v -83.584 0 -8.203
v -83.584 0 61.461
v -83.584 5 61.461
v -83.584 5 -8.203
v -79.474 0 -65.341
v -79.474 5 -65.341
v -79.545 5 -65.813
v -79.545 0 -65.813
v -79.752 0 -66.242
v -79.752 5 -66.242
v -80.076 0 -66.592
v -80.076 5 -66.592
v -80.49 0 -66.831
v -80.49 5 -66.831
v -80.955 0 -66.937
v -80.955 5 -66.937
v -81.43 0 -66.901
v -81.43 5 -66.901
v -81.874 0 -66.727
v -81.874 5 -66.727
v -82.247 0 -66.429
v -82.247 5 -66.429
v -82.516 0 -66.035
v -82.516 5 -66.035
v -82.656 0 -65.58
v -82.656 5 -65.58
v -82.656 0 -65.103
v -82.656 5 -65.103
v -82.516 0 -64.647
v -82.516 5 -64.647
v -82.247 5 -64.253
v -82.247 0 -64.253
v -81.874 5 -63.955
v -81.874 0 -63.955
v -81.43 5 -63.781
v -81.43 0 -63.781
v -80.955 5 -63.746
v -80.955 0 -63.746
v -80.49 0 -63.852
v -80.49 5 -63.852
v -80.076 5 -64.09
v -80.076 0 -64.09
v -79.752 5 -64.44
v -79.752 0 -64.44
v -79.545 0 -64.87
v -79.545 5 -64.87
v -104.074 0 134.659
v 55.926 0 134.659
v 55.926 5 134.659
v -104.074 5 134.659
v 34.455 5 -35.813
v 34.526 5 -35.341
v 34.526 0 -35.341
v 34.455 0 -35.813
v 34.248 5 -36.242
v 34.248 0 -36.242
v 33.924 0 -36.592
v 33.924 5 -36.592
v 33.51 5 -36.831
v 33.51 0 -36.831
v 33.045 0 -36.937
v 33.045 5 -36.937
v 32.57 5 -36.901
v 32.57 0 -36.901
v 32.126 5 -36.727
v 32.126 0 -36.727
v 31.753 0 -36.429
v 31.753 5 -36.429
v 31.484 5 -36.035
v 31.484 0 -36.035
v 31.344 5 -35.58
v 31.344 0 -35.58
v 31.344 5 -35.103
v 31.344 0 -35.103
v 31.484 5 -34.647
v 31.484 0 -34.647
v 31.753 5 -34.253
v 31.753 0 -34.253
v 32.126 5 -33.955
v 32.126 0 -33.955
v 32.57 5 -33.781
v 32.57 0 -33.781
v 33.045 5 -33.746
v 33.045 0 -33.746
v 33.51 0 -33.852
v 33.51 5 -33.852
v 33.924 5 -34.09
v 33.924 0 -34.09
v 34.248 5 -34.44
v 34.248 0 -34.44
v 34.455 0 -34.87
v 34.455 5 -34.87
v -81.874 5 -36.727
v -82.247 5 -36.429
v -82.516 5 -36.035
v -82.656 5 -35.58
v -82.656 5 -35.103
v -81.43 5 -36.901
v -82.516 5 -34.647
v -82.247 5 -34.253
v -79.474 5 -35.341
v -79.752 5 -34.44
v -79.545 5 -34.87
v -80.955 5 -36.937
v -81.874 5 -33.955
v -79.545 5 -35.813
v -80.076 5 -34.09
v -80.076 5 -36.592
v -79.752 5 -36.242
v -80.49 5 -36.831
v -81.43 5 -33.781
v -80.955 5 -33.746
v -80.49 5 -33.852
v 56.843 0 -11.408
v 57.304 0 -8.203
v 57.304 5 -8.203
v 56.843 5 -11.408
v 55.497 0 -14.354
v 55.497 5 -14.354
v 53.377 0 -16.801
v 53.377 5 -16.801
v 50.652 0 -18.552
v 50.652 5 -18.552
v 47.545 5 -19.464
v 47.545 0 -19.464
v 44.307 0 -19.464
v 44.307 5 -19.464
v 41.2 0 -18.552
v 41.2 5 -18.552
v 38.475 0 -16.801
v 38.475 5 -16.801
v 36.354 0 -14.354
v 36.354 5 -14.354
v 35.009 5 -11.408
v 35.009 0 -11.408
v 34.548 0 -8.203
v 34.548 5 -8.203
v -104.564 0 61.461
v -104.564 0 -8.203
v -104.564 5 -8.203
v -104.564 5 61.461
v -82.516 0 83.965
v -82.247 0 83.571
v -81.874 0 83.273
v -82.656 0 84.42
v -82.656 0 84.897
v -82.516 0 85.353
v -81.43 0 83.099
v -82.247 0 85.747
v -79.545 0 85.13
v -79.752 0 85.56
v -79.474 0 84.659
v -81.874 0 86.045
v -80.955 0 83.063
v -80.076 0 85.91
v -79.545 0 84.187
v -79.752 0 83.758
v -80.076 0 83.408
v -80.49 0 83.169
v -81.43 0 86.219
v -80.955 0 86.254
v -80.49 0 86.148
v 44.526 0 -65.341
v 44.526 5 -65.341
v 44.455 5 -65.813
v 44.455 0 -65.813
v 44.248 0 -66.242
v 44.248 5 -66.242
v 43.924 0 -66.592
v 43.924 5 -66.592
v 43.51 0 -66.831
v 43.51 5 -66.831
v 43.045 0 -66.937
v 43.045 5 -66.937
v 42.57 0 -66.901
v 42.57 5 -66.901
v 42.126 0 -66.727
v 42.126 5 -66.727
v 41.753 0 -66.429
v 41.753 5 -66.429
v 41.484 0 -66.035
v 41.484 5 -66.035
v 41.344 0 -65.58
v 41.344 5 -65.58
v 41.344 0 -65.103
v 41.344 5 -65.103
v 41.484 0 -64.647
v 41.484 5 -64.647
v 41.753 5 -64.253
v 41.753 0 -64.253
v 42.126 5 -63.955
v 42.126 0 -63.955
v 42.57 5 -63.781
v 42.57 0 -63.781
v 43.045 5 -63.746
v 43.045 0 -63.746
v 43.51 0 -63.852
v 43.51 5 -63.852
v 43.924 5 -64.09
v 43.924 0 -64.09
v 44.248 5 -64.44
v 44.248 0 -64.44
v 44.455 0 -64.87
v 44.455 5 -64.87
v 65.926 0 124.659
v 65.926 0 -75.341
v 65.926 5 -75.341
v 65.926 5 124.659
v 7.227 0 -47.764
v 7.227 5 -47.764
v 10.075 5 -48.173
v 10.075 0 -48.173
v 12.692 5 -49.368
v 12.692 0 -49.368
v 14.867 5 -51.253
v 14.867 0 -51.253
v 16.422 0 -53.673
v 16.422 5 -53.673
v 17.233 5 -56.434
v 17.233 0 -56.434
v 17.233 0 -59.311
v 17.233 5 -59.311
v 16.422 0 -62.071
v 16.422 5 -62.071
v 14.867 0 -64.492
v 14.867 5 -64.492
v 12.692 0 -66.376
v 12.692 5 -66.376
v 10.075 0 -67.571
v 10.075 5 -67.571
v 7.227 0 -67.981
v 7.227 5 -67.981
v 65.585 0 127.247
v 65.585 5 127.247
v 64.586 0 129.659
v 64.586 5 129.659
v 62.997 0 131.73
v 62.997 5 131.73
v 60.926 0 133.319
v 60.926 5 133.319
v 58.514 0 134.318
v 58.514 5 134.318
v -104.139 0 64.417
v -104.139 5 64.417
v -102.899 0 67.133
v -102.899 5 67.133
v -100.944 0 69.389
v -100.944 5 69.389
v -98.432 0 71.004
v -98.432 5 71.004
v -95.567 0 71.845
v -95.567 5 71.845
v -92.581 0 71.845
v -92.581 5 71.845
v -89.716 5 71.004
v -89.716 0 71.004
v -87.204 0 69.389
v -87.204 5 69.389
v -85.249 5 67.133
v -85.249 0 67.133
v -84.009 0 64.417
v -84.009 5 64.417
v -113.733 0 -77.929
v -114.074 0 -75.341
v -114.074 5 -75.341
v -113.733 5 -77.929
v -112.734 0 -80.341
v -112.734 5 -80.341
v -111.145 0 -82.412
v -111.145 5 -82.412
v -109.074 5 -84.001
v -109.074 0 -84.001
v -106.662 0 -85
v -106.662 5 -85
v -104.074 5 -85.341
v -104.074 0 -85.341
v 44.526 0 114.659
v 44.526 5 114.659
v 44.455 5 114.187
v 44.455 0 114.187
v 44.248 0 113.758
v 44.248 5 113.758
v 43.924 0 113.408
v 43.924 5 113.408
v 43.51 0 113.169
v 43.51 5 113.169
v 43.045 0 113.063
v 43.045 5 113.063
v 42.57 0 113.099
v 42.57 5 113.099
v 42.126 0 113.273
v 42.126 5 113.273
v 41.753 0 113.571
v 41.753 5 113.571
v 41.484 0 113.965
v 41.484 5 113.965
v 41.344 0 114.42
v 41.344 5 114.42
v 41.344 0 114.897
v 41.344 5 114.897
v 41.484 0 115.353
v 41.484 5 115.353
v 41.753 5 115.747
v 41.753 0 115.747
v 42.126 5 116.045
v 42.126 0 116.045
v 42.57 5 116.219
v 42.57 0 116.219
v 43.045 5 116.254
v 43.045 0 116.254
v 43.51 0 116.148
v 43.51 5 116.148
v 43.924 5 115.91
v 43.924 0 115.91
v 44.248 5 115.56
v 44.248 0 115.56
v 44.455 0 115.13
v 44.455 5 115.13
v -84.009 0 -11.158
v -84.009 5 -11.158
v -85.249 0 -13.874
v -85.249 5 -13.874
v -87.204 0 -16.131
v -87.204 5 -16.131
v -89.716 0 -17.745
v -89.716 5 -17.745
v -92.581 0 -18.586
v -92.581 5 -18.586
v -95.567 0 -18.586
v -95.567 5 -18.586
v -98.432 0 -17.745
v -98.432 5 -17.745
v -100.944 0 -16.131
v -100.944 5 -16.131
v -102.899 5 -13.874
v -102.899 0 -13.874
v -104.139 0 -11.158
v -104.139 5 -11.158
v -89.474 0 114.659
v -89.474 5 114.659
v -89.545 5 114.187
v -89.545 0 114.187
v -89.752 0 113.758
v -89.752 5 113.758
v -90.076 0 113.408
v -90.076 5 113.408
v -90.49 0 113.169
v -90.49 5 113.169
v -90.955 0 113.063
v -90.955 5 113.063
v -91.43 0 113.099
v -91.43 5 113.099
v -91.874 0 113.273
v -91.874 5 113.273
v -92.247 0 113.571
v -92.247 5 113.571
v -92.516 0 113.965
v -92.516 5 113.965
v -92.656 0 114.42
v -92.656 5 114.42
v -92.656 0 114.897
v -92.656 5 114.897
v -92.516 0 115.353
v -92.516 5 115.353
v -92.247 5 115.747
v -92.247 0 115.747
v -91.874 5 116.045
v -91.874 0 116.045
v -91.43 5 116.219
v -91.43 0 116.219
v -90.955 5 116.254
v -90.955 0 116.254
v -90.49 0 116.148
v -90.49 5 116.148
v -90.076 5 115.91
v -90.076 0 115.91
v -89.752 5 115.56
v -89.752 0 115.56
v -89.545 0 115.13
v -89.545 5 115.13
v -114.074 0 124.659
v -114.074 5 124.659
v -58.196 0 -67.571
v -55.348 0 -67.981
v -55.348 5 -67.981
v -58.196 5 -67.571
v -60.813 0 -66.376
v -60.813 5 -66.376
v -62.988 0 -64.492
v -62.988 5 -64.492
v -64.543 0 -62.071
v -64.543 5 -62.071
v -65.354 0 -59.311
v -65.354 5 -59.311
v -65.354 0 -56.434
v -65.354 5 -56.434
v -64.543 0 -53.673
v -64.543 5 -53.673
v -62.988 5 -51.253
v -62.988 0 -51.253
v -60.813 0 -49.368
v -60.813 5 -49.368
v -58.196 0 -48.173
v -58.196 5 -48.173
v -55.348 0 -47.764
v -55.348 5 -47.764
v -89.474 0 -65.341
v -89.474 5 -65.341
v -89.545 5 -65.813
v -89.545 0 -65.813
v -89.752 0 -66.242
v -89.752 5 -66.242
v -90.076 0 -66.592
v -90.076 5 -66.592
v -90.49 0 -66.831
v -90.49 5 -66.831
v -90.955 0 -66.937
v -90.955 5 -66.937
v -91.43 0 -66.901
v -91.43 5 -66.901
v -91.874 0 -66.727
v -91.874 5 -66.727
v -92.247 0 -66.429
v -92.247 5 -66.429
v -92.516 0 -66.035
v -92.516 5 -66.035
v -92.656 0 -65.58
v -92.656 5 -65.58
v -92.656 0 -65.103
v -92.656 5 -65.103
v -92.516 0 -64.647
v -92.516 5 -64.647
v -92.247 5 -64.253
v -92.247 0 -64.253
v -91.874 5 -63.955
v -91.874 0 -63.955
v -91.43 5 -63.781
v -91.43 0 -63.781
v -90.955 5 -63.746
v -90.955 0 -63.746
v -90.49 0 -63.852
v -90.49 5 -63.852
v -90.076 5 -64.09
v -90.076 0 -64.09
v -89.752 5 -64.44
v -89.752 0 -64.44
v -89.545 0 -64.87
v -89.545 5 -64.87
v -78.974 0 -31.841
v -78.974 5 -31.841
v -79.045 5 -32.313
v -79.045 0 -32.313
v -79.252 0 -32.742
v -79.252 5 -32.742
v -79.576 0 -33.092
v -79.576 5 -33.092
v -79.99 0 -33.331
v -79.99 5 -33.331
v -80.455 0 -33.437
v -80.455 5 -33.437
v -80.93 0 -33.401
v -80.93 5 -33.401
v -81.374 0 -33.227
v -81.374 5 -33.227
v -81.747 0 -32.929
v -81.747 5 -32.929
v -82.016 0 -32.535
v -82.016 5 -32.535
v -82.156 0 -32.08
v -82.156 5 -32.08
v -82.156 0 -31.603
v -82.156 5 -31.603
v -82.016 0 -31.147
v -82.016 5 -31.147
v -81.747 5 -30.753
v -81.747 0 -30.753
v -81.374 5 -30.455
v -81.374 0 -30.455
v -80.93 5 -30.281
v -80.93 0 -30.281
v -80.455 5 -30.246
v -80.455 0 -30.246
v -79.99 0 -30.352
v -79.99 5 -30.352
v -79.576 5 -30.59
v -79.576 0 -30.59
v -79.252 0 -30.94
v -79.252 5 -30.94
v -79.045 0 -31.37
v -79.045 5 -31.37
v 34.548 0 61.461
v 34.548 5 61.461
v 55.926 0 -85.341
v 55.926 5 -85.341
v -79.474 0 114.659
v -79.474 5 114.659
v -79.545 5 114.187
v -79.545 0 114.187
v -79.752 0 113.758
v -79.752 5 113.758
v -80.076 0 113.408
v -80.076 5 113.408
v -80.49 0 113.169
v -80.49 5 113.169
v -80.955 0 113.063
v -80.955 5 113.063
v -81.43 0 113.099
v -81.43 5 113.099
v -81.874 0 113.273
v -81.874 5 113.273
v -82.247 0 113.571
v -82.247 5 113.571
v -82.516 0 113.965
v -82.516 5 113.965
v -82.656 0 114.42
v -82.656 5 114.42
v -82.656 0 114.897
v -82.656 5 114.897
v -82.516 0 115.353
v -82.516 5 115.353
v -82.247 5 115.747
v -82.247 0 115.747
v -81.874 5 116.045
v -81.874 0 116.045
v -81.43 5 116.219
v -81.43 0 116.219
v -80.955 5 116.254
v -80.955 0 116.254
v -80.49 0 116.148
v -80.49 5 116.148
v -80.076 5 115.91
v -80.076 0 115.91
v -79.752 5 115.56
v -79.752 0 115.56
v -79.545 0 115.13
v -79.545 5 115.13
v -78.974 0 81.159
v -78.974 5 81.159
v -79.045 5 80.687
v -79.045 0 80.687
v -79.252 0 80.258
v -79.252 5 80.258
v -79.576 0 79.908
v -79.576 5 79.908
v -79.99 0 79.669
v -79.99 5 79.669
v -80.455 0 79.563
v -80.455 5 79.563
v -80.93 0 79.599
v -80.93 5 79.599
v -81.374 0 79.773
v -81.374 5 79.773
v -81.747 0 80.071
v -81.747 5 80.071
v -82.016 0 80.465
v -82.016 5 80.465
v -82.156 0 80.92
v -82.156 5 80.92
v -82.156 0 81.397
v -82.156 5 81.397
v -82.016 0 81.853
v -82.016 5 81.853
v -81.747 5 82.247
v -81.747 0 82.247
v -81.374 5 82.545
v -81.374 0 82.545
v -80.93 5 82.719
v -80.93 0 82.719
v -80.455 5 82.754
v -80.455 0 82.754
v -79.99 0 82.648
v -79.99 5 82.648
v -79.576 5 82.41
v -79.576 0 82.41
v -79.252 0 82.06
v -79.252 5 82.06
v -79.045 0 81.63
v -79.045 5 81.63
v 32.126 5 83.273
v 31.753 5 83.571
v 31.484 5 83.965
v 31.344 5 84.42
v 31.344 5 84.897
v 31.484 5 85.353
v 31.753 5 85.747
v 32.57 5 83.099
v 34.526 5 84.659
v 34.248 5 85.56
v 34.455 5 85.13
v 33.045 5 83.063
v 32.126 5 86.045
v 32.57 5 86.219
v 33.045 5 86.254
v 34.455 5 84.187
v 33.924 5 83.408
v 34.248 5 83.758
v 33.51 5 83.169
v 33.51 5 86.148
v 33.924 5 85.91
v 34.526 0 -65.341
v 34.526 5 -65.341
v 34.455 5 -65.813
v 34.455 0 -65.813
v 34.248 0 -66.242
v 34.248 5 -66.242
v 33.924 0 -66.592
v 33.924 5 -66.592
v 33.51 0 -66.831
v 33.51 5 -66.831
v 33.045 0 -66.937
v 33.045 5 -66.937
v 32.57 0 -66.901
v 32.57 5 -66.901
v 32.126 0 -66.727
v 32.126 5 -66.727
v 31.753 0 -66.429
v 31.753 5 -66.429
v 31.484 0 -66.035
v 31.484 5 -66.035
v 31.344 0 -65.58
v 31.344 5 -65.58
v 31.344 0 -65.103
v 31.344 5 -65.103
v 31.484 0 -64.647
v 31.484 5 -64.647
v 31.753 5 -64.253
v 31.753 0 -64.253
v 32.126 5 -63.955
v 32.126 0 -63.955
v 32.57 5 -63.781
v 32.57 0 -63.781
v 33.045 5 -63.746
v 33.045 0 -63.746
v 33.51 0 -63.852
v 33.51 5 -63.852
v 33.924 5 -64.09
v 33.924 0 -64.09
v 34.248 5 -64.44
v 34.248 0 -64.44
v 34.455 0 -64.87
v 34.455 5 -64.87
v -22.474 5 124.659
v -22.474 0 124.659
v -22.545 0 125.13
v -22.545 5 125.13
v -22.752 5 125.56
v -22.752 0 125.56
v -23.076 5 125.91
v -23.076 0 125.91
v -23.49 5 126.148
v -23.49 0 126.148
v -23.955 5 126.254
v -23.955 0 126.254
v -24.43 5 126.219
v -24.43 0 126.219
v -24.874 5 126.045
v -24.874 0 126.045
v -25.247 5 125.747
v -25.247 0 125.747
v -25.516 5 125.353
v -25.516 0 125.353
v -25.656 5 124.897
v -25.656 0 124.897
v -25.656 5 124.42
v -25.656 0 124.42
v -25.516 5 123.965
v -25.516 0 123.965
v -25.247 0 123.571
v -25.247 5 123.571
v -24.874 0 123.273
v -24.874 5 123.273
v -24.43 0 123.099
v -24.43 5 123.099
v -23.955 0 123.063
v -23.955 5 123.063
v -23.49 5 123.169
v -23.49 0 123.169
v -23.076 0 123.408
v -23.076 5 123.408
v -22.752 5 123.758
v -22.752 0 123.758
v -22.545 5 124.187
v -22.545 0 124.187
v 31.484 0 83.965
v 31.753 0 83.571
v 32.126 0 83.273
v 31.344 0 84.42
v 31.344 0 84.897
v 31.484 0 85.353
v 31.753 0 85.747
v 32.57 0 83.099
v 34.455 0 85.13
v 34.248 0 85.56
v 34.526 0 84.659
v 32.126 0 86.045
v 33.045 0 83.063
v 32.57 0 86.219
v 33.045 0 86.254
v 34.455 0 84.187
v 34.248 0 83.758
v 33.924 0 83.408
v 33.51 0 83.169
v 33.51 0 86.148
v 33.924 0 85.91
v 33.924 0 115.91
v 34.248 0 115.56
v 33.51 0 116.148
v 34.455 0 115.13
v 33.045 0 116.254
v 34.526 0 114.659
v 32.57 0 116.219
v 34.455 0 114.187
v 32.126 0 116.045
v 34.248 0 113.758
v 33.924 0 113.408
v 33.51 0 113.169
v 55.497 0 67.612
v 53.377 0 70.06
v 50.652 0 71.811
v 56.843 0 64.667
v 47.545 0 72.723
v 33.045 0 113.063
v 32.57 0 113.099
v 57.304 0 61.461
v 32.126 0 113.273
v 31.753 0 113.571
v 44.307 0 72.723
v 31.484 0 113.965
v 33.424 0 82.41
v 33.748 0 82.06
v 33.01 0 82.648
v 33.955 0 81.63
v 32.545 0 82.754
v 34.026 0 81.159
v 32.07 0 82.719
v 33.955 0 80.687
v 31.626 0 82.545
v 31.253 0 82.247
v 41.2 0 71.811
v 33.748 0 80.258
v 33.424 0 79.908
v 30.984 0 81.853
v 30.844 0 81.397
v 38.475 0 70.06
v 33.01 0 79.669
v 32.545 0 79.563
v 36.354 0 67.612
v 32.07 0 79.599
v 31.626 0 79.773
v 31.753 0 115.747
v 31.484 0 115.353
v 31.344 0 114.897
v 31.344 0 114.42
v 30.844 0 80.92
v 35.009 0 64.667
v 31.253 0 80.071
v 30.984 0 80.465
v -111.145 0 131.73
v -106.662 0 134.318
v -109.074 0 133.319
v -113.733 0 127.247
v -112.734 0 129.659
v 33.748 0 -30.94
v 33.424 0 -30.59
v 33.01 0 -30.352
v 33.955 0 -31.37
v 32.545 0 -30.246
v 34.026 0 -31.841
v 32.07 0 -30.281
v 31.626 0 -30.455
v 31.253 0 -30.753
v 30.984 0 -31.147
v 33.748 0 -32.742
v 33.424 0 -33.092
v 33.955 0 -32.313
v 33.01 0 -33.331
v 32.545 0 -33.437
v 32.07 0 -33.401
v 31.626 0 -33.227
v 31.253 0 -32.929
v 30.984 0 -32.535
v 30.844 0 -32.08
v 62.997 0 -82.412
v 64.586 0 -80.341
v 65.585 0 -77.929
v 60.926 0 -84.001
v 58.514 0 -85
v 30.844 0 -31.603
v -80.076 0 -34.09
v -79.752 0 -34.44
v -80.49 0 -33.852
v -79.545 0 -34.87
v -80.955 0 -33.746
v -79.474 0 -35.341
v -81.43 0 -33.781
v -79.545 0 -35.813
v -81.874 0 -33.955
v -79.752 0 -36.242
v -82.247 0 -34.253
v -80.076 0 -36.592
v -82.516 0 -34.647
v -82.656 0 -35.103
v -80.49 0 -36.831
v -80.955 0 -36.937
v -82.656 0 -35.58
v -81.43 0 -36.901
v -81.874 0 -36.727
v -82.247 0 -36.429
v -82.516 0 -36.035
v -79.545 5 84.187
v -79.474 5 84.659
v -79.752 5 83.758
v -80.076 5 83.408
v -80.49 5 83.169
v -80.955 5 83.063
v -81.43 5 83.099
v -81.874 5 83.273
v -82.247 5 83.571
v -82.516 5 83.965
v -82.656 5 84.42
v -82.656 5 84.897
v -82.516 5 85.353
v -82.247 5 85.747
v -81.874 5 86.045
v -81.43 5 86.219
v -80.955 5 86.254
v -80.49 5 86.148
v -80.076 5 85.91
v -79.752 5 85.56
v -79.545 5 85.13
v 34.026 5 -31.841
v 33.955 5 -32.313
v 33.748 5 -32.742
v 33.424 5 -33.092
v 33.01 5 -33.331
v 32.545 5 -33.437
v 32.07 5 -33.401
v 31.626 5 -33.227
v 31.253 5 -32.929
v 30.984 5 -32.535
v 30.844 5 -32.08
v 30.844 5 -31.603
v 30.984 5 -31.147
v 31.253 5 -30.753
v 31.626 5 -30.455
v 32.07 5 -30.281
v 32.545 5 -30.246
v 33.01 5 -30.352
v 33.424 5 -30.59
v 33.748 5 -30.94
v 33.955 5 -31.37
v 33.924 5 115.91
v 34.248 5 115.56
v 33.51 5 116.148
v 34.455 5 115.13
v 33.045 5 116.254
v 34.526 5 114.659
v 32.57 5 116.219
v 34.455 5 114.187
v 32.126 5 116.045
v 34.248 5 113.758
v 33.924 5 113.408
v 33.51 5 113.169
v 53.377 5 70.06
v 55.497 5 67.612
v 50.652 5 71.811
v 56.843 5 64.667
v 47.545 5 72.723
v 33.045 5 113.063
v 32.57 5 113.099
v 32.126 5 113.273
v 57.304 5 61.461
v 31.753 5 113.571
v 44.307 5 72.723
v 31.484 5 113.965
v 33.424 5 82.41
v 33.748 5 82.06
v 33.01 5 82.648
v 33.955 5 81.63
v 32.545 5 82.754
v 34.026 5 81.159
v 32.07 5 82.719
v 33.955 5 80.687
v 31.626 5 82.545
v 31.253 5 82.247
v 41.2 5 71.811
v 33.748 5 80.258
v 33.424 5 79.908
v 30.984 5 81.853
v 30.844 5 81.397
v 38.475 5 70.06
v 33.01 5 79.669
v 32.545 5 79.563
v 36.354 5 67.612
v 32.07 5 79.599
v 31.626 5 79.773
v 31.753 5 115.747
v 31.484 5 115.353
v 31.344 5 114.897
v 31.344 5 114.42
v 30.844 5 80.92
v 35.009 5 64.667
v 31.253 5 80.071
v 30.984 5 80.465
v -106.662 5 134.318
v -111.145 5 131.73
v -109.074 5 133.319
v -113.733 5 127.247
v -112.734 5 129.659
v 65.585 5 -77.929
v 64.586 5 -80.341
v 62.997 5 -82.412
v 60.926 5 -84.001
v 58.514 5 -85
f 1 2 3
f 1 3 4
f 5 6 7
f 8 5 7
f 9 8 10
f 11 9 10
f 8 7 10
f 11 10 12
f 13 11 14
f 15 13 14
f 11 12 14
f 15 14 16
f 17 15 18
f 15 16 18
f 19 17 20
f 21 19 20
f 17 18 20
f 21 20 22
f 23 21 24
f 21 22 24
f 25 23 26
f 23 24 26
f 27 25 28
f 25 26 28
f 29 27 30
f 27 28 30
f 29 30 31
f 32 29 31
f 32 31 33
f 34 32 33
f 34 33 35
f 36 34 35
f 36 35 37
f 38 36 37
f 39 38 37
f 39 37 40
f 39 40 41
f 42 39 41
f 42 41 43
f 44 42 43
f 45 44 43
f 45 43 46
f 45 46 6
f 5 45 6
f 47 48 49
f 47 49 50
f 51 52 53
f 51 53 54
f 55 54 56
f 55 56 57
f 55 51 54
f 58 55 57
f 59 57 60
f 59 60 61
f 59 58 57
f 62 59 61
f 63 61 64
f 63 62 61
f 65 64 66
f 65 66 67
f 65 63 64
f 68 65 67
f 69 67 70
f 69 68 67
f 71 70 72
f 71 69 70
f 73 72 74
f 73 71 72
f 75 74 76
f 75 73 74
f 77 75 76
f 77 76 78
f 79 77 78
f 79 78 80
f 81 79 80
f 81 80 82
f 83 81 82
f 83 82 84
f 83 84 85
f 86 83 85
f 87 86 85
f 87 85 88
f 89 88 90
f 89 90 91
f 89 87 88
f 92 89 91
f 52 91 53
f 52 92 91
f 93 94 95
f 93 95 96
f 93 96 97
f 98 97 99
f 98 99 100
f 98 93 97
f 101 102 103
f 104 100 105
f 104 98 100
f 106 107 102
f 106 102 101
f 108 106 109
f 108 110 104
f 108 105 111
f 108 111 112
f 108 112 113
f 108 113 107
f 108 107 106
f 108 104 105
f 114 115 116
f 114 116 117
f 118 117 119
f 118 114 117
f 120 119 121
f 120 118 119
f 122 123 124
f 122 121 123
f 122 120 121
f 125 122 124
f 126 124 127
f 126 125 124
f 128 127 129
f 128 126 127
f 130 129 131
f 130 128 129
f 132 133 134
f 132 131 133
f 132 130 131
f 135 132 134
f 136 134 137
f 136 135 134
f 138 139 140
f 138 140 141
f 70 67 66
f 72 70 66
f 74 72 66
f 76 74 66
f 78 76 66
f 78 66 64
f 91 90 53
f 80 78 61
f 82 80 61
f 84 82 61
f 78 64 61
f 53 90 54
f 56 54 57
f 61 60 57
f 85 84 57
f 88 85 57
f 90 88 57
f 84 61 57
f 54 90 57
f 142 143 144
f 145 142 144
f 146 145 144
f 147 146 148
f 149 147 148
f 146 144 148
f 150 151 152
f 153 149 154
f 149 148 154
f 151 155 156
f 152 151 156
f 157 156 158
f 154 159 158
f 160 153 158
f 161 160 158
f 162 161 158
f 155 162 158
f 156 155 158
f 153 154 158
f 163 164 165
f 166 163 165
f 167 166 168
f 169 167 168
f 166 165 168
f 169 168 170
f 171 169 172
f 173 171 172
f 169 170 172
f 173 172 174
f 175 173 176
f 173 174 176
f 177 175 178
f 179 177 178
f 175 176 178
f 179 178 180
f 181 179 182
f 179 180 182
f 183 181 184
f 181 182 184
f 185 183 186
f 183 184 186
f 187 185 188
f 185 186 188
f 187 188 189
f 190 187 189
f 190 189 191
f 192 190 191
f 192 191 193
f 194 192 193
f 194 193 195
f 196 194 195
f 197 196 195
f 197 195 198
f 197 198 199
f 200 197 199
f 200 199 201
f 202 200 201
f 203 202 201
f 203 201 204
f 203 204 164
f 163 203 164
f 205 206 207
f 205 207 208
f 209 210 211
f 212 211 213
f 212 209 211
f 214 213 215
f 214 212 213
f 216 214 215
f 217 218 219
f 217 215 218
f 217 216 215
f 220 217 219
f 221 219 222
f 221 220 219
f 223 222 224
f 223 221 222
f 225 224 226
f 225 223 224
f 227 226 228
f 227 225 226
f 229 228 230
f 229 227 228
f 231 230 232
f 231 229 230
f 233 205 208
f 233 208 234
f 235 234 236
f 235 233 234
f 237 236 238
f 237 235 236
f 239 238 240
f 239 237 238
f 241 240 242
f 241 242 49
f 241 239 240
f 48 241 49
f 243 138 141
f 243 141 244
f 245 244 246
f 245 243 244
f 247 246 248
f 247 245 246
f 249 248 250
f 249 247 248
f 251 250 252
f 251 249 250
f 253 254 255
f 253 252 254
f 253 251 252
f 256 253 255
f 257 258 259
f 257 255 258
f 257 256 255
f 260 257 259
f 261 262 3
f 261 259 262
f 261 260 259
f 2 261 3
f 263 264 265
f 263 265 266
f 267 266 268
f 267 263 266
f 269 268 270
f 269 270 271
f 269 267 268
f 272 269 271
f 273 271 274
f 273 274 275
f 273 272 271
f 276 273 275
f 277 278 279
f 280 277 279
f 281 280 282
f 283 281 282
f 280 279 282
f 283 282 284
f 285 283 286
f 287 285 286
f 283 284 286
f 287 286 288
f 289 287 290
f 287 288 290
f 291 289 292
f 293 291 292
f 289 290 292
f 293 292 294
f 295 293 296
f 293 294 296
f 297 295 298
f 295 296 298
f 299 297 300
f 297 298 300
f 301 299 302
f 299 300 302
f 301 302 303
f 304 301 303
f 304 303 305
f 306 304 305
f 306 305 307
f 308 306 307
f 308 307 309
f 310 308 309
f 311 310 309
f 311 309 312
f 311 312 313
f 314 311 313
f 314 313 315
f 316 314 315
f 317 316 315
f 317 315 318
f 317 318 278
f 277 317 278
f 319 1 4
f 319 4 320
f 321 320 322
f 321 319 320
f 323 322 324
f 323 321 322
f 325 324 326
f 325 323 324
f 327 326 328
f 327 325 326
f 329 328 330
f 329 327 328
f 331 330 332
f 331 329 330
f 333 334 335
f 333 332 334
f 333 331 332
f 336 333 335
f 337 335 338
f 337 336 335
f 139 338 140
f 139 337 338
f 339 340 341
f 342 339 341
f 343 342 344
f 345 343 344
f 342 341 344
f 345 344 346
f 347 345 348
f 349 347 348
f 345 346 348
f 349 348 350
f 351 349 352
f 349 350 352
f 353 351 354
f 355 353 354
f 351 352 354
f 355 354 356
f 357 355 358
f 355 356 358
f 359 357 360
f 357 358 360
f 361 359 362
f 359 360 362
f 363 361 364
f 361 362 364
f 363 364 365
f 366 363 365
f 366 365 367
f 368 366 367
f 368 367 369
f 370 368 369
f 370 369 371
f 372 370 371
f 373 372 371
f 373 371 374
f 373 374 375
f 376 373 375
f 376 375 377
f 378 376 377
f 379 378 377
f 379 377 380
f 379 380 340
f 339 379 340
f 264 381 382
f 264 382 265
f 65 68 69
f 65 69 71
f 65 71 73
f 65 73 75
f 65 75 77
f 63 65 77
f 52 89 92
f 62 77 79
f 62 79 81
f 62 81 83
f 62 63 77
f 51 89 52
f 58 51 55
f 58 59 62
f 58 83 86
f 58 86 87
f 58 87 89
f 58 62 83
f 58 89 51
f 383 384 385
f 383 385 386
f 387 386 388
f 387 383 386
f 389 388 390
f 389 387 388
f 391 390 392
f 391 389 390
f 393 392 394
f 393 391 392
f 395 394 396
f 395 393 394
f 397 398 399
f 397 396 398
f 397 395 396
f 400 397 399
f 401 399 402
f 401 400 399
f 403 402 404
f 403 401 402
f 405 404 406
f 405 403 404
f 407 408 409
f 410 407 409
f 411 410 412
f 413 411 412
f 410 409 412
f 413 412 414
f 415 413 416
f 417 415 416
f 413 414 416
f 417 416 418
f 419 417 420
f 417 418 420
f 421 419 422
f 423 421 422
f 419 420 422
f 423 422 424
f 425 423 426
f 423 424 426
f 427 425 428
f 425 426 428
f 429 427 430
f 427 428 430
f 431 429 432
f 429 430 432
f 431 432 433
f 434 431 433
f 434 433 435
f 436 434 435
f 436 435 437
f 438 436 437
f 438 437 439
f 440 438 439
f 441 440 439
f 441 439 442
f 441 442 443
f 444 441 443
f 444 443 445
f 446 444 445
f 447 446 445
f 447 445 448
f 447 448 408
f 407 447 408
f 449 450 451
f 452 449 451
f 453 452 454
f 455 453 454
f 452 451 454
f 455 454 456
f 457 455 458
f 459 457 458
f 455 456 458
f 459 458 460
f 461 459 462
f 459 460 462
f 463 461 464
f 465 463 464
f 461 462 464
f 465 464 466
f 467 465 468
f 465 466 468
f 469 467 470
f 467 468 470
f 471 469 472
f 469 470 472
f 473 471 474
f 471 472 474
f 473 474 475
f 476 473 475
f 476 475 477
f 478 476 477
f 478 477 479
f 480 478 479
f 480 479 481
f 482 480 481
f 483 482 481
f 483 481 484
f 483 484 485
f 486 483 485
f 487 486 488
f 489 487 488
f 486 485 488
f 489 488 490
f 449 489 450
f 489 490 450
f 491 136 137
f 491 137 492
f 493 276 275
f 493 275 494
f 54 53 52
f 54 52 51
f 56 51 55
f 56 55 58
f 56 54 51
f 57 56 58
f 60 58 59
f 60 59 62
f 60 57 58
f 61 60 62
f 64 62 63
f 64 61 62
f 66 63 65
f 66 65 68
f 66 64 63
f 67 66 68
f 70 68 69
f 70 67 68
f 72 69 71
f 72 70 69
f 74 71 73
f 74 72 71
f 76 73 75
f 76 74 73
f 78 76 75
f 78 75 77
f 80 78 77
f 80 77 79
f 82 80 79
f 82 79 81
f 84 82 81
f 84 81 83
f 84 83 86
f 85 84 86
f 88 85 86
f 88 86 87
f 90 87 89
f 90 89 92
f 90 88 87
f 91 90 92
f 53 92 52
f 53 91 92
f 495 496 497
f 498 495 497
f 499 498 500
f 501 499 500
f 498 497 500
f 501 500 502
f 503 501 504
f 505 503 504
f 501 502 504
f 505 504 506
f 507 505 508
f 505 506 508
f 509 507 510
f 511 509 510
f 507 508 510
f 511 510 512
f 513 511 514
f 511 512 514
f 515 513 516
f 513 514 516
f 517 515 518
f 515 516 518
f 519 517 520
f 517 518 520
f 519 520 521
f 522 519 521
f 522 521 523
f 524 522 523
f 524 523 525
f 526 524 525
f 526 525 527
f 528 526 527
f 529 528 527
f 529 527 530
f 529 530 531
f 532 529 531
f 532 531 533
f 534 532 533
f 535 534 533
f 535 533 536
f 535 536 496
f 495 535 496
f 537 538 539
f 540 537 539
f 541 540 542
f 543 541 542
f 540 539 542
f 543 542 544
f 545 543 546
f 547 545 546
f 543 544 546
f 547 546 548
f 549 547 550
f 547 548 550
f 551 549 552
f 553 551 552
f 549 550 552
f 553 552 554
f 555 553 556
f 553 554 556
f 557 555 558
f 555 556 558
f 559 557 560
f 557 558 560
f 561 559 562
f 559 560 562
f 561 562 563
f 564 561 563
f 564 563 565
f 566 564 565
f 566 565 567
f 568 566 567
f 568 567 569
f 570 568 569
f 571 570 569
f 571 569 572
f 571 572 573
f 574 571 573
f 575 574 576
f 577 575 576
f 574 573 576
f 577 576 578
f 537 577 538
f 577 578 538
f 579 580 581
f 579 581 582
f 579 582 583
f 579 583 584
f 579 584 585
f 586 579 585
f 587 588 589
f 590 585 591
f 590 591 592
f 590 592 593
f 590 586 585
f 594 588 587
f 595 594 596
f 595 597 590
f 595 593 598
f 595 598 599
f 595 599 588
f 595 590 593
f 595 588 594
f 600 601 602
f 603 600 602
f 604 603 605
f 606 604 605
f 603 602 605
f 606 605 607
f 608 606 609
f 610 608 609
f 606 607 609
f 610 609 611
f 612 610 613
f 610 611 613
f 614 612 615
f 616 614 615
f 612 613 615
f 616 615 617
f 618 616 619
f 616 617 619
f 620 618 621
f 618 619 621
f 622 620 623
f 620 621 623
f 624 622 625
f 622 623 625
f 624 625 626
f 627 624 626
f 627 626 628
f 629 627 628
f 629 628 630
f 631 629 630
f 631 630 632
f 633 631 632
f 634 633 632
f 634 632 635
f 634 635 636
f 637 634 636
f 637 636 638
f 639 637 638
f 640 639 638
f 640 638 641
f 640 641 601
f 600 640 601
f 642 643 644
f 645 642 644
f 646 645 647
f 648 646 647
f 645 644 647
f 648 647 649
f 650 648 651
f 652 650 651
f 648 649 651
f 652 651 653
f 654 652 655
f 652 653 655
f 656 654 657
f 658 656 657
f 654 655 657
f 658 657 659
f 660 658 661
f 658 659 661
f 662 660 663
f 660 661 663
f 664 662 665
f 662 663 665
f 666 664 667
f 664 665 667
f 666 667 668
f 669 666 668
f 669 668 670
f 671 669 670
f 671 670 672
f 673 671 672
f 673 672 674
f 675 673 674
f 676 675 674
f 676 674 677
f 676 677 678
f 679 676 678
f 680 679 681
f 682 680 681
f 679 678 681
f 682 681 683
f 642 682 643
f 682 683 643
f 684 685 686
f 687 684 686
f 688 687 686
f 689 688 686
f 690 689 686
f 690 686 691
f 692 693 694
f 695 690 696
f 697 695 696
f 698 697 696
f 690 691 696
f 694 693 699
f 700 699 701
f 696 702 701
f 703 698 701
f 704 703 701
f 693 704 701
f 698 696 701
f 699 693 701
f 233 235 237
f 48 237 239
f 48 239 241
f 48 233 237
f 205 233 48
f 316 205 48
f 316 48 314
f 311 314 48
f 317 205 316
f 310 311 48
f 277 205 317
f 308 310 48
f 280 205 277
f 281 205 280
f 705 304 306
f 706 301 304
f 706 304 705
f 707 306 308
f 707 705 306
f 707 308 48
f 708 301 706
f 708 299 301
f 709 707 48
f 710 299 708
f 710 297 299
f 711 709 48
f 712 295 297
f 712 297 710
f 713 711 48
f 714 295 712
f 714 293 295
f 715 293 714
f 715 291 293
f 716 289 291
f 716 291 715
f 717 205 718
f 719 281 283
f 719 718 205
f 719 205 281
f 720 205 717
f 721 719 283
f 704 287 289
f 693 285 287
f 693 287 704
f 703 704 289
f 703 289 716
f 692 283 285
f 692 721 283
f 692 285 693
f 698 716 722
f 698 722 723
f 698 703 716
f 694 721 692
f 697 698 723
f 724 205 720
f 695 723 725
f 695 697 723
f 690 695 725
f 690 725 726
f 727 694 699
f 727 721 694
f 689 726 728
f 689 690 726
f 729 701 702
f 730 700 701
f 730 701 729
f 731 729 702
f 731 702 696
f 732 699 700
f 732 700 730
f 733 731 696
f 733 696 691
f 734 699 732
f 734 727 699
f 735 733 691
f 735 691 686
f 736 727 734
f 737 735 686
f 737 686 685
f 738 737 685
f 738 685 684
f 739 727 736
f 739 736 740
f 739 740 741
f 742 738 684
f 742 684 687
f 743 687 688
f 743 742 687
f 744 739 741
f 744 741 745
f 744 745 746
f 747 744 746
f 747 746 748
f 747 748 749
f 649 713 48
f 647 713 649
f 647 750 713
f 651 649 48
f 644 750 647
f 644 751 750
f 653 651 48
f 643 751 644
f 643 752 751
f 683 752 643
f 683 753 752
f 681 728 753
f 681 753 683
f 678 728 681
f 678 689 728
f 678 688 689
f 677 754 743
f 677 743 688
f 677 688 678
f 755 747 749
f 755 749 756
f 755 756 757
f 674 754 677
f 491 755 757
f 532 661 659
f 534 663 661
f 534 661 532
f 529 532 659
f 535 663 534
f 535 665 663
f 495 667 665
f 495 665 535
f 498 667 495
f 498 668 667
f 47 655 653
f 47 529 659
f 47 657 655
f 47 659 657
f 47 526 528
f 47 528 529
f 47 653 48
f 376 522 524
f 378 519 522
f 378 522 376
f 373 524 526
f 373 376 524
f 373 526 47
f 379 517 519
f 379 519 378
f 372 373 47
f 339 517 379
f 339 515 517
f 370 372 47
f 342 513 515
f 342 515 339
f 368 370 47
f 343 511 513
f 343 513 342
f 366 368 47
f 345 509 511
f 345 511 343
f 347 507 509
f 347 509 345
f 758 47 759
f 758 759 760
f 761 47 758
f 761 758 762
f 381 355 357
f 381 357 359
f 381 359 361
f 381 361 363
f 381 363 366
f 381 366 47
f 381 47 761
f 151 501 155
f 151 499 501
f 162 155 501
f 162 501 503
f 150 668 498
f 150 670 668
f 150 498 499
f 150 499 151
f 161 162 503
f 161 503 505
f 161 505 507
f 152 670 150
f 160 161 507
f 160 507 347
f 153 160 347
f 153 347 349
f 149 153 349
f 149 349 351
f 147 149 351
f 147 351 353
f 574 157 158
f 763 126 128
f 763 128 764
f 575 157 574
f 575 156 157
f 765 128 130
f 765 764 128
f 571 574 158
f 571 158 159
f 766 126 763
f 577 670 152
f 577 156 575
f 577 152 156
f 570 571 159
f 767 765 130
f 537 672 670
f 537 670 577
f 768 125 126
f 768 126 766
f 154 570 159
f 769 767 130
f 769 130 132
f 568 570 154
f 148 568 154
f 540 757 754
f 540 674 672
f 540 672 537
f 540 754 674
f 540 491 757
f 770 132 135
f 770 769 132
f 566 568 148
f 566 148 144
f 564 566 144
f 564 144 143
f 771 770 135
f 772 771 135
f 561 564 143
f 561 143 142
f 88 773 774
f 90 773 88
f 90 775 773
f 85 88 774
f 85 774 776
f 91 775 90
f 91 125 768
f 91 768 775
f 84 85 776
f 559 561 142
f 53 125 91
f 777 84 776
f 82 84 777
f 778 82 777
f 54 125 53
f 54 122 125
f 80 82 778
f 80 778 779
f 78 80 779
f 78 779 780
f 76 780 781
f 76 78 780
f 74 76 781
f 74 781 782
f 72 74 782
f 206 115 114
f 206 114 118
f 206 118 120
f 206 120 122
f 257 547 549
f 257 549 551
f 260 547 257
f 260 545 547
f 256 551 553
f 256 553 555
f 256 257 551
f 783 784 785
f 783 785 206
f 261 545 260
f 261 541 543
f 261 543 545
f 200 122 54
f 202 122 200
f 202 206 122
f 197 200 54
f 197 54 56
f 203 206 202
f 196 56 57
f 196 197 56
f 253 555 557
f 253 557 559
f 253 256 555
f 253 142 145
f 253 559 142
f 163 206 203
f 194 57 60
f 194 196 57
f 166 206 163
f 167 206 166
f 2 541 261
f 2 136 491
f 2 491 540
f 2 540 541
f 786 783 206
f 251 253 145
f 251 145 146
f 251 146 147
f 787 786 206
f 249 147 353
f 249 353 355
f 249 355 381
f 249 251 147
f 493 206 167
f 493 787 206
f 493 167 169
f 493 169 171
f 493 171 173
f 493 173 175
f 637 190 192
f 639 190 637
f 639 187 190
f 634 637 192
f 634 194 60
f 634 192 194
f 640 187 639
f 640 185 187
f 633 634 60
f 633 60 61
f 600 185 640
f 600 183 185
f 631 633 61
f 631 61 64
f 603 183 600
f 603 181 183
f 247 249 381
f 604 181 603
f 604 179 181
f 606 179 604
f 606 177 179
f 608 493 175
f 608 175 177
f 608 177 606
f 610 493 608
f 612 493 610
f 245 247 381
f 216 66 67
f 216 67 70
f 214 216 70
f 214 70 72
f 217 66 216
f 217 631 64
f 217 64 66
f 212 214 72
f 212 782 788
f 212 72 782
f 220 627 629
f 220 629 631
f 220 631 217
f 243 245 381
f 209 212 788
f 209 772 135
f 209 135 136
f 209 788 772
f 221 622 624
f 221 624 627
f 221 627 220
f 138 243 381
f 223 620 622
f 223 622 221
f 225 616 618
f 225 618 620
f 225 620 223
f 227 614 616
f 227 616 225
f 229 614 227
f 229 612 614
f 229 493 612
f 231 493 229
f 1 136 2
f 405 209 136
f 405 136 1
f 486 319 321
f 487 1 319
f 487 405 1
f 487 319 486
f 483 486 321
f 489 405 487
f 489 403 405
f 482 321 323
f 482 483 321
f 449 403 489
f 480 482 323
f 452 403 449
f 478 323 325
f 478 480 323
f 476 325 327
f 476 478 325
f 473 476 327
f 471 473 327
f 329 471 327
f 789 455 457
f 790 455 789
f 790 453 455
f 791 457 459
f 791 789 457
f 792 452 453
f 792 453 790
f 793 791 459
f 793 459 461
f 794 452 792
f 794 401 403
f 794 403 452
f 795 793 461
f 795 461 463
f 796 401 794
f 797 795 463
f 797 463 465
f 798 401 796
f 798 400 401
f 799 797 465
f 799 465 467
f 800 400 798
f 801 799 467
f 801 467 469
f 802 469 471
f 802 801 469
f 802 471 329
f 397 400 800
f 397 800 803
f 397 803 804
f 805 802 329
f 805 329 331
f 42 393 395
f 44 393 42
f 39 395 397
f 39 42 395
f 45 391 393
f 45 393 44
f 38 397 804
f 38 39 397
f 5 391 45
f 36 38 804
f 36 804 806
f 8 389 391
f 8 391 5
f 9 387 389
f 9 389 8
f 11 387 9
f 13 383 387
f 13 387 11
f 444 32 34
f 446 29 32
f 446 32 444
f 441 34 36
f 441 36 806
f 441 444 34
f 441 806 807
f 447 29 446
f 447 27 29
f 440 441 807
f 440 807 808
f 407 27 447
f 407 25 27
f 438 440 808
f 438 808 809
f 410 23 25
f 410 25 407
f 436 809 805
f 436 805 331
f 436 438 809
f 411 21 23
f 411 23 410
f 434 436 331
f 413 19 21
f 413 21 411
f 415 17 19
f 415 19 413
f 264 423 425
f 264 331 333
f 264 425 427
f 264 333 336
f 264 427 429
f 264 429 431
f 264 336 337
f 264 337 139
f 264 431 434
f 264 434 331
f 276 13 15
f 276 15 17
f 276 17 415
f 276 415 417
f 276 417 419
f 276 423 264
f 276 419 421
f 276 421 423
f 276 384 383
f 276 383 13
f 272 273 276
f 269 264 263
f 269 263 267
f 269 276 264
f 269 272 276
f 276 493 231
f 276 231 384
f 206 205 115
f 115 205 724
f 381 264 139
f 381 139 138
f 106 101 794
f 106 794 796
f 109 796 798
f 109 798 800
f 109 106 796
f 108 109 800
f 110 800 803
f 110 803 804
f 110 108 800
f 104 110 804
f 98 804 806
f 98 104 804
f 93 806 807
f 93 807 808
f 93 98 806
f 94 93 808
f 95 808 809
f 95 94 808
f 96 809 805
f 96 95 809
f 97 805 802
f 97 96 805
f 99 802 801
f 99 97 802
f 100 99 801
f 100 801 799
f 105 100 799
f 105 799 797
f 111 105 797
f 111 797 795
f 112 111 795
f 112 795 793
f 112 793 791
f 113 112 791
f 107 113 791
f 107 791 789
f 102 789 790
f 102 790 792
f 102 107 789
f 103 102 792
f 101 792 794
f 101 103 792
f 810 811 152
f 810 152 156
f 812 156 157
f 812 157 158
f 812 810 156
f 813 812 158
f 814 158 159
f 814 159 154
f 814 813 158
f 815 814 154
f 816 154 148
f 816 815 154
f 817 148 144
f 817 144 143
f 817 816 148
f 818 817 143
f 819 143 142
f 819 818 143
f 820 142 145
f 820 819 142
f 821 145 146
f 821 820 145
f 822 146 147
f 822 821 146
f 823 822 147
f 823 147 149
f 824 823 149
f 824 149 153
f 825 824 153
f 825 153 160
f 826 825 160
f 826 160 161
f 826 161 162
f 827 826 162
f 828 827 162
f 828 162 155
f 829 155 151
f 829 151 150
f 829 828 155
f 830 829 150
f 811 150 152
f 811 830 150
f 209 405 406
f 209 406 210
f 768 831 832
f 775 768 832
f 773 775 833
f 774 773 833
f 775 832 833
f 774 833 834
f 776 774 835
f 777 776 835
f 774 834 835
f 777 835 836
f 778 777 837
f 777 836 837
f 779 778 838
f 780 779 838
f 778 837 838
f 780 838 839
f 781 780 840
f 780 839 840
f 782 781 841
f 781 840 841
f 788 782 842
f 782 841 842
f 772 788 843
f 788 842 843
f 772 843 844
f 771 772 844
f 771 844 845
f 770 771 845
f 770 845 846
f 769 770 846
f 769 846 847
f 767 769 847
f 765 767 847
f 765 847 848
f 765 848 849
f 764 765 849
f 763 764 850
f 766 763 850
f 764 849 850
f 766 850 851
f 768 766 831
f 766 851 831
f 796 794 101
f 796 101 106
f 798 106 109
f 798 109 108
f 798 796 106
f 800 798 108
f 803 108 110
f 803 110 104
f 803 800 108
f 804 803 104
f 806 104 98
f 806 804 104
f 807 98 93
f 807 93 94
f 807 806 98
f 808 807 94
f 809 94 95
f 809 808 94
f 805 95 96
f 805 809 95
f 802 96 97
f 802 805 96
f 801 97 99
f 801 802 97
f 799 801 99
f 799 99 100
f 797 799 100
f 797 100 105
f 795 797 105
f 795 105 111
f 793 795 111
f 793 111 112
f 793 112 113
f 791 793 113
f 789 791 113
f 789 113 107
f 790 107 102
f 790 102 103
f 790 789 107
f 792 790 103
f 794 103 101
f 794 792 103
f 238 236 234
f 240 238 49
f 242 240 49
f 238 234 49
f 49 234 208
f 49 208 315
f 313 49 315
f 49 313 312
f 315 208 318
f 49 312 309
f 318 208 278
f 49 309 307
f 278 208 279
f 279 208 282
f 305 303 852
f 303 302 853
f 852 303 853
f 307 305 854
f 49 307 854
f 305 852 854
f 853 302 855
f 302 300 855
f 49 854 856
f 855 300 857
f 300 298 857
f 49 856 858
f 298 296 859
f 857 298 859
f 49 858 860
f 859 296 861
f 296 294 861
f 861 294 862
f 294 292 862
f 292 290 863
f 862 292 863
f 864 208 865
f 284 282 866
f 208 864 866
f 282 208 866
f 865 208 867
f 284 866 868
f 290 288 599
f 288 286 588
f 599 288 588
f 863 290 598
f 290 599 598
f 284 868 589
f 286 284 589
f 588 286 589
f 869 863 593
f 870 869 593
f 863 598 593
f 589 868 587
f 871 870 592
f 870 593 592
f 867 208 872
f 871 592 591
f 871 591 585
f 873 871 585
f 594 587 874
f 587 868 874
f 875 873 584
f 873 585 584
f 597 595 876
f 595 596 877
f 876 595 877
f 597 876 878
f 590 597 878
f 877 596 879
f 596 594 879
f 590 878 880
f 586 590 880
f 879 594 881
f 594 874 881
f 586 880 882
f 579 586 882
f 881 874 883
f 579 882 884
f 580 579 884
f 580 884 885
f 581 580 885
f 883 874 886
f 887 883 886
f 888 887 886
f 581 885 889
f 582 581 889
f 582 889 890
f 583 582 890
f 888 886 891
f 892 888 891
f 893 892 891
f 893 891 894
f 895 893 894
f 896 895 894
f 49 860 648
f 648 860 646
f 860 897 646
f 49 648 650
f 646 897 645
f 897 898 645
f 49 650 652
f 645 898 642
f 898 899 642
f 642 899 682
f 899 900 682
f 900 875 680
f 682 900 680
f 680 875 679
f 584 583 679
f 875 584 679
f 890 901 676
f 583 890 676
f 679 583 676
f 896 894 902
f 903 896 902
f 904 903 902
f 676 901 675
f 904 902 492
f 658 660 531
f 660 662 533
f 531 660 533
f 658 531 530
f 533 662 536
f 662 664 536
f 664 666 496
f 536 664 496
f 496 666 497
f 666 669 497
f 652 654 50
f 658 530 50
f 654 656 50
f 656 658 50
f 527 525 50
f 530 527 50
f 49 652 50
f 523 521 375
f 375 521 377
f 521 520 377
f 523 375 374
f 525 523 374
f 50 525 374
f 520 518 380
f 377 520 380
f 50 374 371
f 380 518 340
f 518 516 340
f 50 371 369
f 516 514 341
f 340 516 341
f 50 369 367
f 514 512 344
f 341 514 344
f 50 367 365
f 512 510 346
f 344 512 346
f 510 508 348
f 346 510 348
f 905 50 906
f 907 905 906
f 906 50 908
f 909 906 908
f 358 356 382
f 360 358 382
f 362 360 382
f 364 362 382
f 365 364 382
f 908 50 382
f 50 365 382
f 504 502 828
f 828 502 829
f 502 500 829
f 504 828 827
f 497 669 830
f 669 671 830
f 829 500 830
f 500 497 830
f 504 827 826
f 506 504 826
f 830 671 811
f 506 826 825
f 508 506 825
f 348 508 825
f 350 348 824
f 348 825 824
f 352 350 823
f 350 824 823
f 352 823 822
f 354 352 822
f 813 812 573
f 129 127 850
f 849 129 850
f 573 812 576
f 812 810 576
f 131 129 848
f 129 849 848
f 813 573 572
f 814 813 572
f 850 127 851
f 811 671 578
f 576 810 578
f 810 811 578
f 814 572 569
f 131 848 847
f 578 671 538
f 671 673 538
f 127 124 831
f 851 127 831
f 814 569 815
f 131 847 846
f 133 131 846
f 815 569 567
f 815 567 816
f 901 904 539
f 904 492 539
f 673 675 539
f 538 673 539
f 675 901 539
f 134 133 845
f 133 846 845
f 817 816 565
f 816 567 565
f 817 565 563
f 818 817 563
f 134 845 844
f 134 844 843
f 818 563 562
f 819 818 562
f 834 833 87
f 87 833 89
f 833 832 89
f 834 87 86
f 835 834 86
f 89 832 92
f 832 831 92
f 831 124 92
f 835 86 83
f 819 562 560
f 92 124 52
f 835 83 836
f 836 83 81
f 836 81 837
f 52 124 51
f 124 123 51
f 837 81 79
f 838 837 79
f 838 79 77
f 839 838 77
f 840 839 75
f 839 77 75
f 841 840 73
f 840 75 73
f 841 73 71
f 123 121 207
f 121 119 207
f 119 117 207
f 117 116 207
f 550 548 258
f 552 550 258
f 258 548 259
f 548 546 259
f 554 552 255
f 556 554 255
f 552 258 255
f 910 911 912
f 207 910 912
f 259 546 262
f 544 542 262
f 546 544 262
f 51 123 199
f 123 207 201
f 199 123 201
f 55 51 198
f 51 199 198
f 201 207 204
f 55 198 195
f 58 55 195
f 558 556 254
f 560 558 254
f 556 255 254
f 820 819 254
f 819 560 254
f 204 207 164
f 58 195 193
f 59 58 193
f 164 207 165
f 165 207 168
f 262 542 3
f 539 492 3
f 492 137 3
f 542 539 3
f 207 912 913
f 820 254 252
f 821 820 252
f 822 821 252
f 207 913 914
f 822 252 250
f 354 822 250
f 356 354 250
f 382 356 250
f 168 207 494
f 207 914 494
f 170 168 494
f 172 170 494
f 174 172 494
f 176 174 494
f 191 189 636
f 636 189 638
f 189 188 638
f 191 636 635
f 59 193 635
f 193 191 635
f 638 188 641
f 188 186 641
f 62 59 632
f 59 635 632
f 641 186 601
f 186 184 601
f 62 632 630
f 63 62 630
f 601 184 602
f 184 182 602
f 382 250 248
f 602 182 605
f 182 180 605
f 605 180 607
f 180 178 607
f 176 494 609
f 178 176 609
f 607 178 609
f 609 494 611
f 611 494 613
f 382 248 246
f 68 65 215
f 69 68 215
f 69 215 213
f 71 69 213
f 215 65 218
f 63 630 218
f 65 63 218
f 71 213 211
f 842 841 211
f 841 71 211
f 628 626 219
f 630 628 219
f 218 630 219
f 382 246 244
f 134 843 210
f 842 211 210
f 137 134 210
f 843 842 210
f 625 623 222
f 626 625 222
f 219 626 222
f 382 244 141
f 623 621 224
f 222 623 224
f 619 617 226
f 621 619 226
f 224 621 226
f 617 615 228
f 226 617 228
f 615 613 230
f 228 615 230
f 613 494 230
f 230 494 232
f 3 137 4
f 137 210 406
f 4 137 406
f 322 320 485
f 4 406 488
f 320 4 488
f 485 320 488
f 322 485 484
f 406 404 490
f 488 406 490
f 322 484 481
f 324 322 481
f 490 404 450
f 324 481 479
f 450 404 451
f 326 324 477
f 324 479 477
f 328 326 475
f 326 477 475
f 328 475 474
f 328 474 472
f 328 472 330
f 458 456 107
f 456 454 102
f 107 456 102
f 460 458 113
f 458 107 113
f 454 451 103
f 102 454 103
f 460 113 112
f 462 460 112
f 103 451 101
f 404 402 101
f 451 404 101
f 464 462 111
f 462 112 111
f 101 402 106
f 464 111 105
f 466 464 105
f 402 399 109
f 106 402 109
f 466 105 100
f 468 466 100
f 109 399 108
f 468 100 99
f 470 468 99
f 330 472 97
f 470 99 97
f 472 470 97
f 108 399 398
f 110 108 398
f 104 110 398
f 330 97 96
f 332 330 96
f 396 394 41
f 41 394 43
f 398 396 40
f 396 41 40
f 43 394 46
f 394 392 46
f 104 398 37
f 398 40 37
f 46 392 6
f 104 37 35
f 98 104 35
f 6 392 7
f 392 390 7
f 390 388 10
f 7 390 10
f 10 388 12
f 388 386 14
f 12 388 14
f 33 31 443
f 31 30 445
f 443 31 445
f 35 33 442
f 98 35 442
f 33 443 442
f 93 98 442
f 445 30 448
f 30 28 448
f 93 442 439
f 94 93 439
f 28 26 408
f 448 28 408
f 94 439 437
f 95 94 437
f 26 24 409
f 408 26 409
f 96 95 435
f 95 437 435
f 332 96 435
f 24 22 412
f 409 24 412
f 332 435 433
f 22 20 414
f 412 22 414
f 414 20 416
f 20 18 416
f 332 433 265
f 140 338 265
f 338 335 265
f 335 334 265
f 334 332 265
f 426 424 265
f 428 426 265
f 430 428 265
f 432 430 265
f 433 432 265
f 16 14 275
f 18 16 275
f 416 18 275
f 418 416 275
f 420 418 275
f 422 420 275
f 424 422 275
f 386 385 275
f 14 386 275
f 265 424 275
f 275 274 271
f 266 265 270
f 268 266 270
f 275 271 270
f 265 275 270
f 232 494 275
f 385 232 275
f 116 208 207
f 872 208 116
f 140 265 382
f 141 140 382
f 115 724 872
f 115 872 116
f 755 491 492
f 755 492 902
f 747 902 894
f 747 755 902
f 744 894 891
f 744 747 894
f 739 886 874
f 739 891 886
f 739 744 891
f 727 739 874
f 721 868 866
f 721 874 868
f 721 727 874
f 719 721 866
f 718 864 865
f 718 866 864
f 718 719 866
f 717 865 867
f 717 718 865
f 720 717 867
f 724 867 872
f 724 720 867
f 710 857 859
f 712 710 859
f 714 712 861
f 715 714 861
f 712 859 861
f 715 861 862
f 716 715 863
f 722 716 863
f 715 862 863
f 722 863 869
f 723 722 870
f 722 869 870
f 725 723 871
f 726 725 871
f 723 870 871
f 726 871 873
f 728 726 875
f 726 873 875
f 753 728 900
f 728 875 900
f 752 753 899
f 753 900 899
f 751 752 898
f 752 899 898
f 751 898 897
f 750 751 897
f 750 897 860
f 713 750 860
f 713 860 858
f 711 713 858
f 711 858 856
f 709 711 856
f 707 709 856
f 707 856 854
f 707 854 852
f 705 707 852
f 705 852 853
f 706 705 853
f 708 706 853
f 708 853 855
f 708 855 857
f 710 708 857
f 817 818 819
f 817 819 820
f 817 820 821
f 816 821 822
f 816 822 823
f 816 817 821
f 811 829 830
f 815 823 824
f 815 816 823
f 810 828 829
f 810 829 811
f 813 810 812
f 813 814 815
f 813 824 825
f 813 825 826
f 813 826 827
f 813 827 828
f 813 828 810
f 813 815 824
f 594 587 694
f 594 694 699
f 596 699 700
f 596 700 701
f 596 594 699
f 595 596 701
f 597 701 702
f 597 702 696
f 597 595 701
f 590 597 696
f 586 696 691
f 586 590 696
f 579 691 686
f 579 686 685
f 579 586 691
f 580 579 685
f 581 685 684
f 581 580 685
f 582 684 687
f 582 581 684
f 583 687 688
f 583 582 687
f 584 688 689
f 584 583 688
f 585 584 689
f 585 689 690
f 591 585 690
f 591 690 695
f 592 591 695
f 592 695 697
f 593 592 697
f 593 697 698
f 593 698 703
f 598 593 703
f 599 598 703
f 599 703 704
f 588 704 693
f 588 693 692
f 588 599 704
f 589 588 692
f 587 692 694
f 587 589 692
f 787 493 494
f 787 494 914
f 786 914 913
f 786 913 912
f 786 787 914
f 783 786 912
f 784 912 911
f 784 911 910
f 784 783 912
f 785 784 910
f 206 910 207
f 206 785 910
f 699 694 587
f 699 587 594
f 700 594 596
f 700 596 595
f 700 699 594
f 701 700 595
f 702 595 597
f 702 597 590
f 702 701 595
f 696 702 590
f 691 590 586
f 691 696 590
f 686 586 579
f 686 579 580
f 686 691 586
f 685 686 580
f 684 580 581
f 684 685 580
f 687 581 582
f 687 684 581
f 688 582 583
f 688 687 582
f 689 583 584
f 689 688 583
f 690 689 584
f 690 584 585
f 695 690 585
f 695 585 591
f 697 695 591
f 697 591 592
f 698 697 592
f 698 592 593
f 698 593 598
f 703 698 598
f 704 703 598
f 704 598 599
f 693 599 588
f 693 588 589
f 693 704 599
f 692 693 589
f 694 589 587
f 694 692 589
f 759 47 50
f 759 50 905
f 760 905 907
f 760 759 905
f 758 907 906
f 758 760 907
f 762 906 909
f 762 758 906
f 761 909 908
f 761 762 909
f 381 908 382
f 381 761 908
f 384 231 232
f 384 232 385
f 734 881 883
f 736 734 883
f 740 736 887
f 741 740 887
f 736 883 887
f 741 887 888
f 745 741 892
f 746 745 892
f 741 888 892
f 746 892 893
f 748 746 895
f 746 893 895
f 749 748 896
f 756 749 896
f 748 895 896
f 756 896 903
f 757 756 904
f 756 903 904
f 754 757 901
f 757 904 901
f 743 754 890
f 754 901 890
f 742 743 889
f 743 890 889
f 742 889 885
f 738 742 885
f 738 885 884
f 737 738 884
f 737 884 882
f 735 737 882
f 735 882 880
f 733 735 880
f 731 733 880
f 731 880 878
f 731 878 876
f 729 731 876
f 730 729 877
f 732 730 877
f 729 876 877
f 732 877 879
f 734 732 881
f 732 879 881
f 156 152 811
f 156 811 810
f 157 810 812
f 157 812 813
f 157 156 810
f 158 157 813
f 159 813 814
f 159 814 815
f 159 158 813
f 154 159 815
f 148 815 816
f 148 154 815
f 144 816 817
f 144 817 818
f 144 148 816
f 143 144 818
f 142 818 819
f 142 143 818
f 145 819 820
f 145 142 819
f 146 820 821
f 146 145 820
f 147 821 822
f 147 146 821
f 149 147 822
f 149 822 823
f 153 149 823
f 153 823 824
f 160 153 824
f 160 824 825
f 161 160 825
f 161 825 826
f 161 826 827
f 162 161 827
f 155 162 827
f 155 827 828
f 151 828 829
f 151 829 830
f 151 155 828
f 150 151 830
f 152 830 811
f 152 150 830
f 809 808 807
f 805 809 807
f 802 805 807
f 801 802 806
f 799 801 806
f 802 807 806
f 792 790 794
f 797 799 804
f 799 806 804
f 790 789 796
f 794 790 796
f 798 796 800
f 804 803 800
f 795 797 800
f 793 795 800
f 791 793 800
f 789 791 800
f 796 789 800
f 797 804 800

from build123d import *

# Parameters (mm, degrees)
SKETCH_1_R          = 1.6
EXTRUDE_1_DEPTH     = 5
SKETCH_4_R          = 1.6
CUT_EXTRUDE_2_DEPTH = 10
SKETCH_5_R          = 1.6
EXTRUDE_3_DEPTH     = 5
EXTRUDE_3_2_DEPTH   = 5
EXTRUDE_3_3_DEPTH   = 5
EXTRUDE_3_4_DEPTH   = 5
SKETCH_6_R          = 1.6
CUT_EXTRUDE_3_DEPTH = 5
SKETCH_8_R          = 1.6
CUT_EXTRUDE_4_DEPTH = 5
CUT_EXTRUDE_5_DEPTH = 10
SKETCH_10_R         = 1.6
CUT_EXTRUDE_6_DEPTH = 10


with BuildPart() as part:
    # 草图1 → 凸台-拉伸1 (new body)
    with BuildSketch(Plane(origin=(0, 0, 0), x_dir=(1, 0, 0), z_dir=(0, 1, 0))):
        with BuildLine():
            Line((-104.074074074, 85.341130604), (55.925925926, 85.341130604))
            ThreePointArc((55.925925926, 85.341130604), (62.996993738, 82.412198416), (65.925925926, 75.341130604))
            Line((65.925925926, 75.341130604), (65.925925926, -124.658869396))
            ThreePointArc((65.925925926, -124.658869396), (62.996993738, -131.729937208), (55.925925926, -134.658869396))
            Line((55.925925926, -134.658869396), (-104.074074074, -134.658869396))
            ThreePointArc((-104.074074074, -134.658869396), (-111.145141886, -131.729937208), (-114.074074074, -124.658869396))
            Line((-114.074074074, -124.658869396), (-114.074074074, 75.341130604))
            ThreePointArc((-114.074074074, 75.341130604), (-111.145141886, 82.412198416), (-104.074074074, 85.341130604))
        make_face()
        with Locations((-81.074074074, 35.341130604)):
            Circle(SKETCH_1_R, mode=Mode.SUBTRACT)
        with Locations((32.925925926, 35.341130604)):
            Circle(SKETCH_1_R, mode=Mode.SUBTRACT)
        with Locations((32.925925926, -84.658869396)):
            Circle(SKETCH_1_R, mode=Mode.SUBTRACT)
        with Locations((-81.074074074, -84.658869396)):
            Circle(SKETCH_1_R, mode=Mode.SUBTRACT)
    extrude(amount=EXTRUDE_1_DEPTH)

    # 草图4 → 切除-拉伸2 (cut)
    with BuildSketch(Plane(origin=(0, 5, 0), x_dir=(1, 0, 0), z_dir=(0, 1, 0))):
        with Locations((-81.074074074, 65.341130604)):
            Circle(SKETCH_4_R)
        with Locations((32.925925926, 65.341130604)):
            Circle(SKETCH_4_R)
        with Locations((-81.074074074, -114.658869396)):
            Circle(SKETCH_4_R)
        with Locations((32.925925926, -114.658869396)):
            Circle(SKETCH_4_R)
    extrude(amount=-CUT_EXTRUDE_2_DEPTH, mode=Mode.SUBTRACT)

    # 草图6 → 切除-拉伸3 (cut)
    with BuildSketch(Plane(origin=(0, 5, 0), x_dir=(1, 0, 0), z_dir=(0, 1, 0))):
        with Locations((-80.574074074, -81.158869396)):
            Circle(SKETCH_6_R)
        with Locations((-80.574074074, 31.841130604)):
            Circle(SKETCH_6_R)
        with Locations((32.425925926, 31.841130604)):
            Circle(SKETCH_6_R)
        with Locations((32.425925926, -81.158869396)):
            Circle(SKETCH_6_R)
    extrude(amount=-CUT_EXTRUDE_3_DEPTH, mode=Mode.SUBTRACT)

    # 草图8 → 切除-拉伸4 (cut)
    with BuildSketch(Plane.XZ):
        with Locations((-24.074074074, 124.658869396)):
            Circle(SKETCH_8_R)
    extrude(amount=-CUT_EXTRUDE_4_DEPTH, mode=Mode.SUBTRACT)

    # 草图9 → 切除-拉伸5 (cut)
    with BuildSketch(Plane.XZ):
        with BuildLine():
            Line((-83.583774313, 61.461195306), (-83.583774313, -8.202630081))
            ThreePointArc((-83.583774313, -8.202630081), (-94.074074074, -18.692929841), (-104.564373835, -8.202630081))
            Line((-104.564373835, -8.202630081), (-104.564373835, 61.461195306))
            ThreePointArc((-104.564373835, 61.461195306), (-94.074074074, 71.951495067), (-83.583774313, 61.461195306))
        make_face()
        with BuildLine():
            Line((57.303514341, 61.461195306), (57.303514341, -8.202630081))
            ThreePointArc((57.303514341, -8.202630081), (45.925925926, -19.580218496), (34.54833751, -8.202630081))
            Line((34.54833751, -8.202630081), (34.54833751, 61.461195306))
            ThreePointArc((34.54833751, 61.461195306), (45.925925926, 72.838783721), (57.303514341, 61.461195306))
        make_face()
        with BuildLine():
            Line((-55.348114705, -47.763685582), (7.227090262, -47.763685582))
            ThreePointArc((7.227090262, -47.763685582), (17.335582771, -57.87217809), (7.227090262, -67.980670599))
            Line((7.227090262, -67.980670599), (-55.348114705, -67.980670599))
            ThreePointArc((-55.348114705, -67.980670599), (-65.456607213, -57.87217809), (-55.348114705, -47.763685582))
        make_face()
    extrude(amount=-CUT_EXTRUDE_5_DEPTH, mode=Mode.SUBTRACT)

    # 草图10 → 切除-拉伸6 (cut)
    with BuildSketch(Plane(origin=(0, 5, 0), x_dir=(1, 0, 0), z_dir=(0, 1, 0))):
        with Locations((-91.074074074, 65.341130604)):
            Circle(SKETCH_10_R)
        with Locations((42.925925926, 65.341130604)):
            Circle(SKETCH_10_R)
        with Locations((-91.074074074, -114.658869396)):
            Circle(SKETCH_10_R)
        with Locations((42.925925926, -114.658869396)):
            Circle(SKETCH_10_R)
    extrude(amount=-CUT_EXTRUDE_6_DEPTH, mode=Mode.SUBTRACT)


with BuildPart() as body_2:
    # 草图5 → 凸台-拉伸3 (new body)
    with BuildSketch(Plane(origin=(0, 5, 0), x_dir=(1, 0, 0), z_dir=(0, 1, 0))):
        with Locations((-81.074074074, 35.341130604)):
            Circle(SKETCH_5_R)
    extrude(amount=-EXTRUDE_3_DEPTH)


with BuildPart() as body_3:
    # 草图5 → Extrude 3 2 (new body)
    with BuildSketch(Plane(origin=(0, 5, 0), x_dir=(1, 0, 0), z_dir=(0, 1, 0))):
        with Locations((32.925925926, 35.341130604)):
            Circle(SKETCH_5_R)
    extrude(amount=-EXTRUDE_3_2_DEPTH)


with BuildPart() as body_4:
    # 草图5 → Extrude 3 3 (new body)
    with BuildSketch(Plane(origin=(0, 5, 0), x_dir=(1, 0, 0), z_dir=(0, 1, 0))):
        with Locations((32.925925926, -84.658869396)):
            Circle(SKETCH_5_R)
    extrude(amount=-EXTRUDE_3_3_DEPTH)


with BuildPart() as body_5:
    # 草图5 → Extrude 3 4 (new body)
    with BuildSketch(Plane(origin=(0, 5, 0), x_dir=(1, 0, 0), z_dir=(0, 1, 0))):
        with Locations((-81.074074074, -84.658869396)):
            Circle(SKETCH_5_R)
    extrude(amount=-EXTRUDE_3_4_DEPTH)


solid = Compound([part.part, body_2.part, body_3.part, body_4.part, body_5.part])
